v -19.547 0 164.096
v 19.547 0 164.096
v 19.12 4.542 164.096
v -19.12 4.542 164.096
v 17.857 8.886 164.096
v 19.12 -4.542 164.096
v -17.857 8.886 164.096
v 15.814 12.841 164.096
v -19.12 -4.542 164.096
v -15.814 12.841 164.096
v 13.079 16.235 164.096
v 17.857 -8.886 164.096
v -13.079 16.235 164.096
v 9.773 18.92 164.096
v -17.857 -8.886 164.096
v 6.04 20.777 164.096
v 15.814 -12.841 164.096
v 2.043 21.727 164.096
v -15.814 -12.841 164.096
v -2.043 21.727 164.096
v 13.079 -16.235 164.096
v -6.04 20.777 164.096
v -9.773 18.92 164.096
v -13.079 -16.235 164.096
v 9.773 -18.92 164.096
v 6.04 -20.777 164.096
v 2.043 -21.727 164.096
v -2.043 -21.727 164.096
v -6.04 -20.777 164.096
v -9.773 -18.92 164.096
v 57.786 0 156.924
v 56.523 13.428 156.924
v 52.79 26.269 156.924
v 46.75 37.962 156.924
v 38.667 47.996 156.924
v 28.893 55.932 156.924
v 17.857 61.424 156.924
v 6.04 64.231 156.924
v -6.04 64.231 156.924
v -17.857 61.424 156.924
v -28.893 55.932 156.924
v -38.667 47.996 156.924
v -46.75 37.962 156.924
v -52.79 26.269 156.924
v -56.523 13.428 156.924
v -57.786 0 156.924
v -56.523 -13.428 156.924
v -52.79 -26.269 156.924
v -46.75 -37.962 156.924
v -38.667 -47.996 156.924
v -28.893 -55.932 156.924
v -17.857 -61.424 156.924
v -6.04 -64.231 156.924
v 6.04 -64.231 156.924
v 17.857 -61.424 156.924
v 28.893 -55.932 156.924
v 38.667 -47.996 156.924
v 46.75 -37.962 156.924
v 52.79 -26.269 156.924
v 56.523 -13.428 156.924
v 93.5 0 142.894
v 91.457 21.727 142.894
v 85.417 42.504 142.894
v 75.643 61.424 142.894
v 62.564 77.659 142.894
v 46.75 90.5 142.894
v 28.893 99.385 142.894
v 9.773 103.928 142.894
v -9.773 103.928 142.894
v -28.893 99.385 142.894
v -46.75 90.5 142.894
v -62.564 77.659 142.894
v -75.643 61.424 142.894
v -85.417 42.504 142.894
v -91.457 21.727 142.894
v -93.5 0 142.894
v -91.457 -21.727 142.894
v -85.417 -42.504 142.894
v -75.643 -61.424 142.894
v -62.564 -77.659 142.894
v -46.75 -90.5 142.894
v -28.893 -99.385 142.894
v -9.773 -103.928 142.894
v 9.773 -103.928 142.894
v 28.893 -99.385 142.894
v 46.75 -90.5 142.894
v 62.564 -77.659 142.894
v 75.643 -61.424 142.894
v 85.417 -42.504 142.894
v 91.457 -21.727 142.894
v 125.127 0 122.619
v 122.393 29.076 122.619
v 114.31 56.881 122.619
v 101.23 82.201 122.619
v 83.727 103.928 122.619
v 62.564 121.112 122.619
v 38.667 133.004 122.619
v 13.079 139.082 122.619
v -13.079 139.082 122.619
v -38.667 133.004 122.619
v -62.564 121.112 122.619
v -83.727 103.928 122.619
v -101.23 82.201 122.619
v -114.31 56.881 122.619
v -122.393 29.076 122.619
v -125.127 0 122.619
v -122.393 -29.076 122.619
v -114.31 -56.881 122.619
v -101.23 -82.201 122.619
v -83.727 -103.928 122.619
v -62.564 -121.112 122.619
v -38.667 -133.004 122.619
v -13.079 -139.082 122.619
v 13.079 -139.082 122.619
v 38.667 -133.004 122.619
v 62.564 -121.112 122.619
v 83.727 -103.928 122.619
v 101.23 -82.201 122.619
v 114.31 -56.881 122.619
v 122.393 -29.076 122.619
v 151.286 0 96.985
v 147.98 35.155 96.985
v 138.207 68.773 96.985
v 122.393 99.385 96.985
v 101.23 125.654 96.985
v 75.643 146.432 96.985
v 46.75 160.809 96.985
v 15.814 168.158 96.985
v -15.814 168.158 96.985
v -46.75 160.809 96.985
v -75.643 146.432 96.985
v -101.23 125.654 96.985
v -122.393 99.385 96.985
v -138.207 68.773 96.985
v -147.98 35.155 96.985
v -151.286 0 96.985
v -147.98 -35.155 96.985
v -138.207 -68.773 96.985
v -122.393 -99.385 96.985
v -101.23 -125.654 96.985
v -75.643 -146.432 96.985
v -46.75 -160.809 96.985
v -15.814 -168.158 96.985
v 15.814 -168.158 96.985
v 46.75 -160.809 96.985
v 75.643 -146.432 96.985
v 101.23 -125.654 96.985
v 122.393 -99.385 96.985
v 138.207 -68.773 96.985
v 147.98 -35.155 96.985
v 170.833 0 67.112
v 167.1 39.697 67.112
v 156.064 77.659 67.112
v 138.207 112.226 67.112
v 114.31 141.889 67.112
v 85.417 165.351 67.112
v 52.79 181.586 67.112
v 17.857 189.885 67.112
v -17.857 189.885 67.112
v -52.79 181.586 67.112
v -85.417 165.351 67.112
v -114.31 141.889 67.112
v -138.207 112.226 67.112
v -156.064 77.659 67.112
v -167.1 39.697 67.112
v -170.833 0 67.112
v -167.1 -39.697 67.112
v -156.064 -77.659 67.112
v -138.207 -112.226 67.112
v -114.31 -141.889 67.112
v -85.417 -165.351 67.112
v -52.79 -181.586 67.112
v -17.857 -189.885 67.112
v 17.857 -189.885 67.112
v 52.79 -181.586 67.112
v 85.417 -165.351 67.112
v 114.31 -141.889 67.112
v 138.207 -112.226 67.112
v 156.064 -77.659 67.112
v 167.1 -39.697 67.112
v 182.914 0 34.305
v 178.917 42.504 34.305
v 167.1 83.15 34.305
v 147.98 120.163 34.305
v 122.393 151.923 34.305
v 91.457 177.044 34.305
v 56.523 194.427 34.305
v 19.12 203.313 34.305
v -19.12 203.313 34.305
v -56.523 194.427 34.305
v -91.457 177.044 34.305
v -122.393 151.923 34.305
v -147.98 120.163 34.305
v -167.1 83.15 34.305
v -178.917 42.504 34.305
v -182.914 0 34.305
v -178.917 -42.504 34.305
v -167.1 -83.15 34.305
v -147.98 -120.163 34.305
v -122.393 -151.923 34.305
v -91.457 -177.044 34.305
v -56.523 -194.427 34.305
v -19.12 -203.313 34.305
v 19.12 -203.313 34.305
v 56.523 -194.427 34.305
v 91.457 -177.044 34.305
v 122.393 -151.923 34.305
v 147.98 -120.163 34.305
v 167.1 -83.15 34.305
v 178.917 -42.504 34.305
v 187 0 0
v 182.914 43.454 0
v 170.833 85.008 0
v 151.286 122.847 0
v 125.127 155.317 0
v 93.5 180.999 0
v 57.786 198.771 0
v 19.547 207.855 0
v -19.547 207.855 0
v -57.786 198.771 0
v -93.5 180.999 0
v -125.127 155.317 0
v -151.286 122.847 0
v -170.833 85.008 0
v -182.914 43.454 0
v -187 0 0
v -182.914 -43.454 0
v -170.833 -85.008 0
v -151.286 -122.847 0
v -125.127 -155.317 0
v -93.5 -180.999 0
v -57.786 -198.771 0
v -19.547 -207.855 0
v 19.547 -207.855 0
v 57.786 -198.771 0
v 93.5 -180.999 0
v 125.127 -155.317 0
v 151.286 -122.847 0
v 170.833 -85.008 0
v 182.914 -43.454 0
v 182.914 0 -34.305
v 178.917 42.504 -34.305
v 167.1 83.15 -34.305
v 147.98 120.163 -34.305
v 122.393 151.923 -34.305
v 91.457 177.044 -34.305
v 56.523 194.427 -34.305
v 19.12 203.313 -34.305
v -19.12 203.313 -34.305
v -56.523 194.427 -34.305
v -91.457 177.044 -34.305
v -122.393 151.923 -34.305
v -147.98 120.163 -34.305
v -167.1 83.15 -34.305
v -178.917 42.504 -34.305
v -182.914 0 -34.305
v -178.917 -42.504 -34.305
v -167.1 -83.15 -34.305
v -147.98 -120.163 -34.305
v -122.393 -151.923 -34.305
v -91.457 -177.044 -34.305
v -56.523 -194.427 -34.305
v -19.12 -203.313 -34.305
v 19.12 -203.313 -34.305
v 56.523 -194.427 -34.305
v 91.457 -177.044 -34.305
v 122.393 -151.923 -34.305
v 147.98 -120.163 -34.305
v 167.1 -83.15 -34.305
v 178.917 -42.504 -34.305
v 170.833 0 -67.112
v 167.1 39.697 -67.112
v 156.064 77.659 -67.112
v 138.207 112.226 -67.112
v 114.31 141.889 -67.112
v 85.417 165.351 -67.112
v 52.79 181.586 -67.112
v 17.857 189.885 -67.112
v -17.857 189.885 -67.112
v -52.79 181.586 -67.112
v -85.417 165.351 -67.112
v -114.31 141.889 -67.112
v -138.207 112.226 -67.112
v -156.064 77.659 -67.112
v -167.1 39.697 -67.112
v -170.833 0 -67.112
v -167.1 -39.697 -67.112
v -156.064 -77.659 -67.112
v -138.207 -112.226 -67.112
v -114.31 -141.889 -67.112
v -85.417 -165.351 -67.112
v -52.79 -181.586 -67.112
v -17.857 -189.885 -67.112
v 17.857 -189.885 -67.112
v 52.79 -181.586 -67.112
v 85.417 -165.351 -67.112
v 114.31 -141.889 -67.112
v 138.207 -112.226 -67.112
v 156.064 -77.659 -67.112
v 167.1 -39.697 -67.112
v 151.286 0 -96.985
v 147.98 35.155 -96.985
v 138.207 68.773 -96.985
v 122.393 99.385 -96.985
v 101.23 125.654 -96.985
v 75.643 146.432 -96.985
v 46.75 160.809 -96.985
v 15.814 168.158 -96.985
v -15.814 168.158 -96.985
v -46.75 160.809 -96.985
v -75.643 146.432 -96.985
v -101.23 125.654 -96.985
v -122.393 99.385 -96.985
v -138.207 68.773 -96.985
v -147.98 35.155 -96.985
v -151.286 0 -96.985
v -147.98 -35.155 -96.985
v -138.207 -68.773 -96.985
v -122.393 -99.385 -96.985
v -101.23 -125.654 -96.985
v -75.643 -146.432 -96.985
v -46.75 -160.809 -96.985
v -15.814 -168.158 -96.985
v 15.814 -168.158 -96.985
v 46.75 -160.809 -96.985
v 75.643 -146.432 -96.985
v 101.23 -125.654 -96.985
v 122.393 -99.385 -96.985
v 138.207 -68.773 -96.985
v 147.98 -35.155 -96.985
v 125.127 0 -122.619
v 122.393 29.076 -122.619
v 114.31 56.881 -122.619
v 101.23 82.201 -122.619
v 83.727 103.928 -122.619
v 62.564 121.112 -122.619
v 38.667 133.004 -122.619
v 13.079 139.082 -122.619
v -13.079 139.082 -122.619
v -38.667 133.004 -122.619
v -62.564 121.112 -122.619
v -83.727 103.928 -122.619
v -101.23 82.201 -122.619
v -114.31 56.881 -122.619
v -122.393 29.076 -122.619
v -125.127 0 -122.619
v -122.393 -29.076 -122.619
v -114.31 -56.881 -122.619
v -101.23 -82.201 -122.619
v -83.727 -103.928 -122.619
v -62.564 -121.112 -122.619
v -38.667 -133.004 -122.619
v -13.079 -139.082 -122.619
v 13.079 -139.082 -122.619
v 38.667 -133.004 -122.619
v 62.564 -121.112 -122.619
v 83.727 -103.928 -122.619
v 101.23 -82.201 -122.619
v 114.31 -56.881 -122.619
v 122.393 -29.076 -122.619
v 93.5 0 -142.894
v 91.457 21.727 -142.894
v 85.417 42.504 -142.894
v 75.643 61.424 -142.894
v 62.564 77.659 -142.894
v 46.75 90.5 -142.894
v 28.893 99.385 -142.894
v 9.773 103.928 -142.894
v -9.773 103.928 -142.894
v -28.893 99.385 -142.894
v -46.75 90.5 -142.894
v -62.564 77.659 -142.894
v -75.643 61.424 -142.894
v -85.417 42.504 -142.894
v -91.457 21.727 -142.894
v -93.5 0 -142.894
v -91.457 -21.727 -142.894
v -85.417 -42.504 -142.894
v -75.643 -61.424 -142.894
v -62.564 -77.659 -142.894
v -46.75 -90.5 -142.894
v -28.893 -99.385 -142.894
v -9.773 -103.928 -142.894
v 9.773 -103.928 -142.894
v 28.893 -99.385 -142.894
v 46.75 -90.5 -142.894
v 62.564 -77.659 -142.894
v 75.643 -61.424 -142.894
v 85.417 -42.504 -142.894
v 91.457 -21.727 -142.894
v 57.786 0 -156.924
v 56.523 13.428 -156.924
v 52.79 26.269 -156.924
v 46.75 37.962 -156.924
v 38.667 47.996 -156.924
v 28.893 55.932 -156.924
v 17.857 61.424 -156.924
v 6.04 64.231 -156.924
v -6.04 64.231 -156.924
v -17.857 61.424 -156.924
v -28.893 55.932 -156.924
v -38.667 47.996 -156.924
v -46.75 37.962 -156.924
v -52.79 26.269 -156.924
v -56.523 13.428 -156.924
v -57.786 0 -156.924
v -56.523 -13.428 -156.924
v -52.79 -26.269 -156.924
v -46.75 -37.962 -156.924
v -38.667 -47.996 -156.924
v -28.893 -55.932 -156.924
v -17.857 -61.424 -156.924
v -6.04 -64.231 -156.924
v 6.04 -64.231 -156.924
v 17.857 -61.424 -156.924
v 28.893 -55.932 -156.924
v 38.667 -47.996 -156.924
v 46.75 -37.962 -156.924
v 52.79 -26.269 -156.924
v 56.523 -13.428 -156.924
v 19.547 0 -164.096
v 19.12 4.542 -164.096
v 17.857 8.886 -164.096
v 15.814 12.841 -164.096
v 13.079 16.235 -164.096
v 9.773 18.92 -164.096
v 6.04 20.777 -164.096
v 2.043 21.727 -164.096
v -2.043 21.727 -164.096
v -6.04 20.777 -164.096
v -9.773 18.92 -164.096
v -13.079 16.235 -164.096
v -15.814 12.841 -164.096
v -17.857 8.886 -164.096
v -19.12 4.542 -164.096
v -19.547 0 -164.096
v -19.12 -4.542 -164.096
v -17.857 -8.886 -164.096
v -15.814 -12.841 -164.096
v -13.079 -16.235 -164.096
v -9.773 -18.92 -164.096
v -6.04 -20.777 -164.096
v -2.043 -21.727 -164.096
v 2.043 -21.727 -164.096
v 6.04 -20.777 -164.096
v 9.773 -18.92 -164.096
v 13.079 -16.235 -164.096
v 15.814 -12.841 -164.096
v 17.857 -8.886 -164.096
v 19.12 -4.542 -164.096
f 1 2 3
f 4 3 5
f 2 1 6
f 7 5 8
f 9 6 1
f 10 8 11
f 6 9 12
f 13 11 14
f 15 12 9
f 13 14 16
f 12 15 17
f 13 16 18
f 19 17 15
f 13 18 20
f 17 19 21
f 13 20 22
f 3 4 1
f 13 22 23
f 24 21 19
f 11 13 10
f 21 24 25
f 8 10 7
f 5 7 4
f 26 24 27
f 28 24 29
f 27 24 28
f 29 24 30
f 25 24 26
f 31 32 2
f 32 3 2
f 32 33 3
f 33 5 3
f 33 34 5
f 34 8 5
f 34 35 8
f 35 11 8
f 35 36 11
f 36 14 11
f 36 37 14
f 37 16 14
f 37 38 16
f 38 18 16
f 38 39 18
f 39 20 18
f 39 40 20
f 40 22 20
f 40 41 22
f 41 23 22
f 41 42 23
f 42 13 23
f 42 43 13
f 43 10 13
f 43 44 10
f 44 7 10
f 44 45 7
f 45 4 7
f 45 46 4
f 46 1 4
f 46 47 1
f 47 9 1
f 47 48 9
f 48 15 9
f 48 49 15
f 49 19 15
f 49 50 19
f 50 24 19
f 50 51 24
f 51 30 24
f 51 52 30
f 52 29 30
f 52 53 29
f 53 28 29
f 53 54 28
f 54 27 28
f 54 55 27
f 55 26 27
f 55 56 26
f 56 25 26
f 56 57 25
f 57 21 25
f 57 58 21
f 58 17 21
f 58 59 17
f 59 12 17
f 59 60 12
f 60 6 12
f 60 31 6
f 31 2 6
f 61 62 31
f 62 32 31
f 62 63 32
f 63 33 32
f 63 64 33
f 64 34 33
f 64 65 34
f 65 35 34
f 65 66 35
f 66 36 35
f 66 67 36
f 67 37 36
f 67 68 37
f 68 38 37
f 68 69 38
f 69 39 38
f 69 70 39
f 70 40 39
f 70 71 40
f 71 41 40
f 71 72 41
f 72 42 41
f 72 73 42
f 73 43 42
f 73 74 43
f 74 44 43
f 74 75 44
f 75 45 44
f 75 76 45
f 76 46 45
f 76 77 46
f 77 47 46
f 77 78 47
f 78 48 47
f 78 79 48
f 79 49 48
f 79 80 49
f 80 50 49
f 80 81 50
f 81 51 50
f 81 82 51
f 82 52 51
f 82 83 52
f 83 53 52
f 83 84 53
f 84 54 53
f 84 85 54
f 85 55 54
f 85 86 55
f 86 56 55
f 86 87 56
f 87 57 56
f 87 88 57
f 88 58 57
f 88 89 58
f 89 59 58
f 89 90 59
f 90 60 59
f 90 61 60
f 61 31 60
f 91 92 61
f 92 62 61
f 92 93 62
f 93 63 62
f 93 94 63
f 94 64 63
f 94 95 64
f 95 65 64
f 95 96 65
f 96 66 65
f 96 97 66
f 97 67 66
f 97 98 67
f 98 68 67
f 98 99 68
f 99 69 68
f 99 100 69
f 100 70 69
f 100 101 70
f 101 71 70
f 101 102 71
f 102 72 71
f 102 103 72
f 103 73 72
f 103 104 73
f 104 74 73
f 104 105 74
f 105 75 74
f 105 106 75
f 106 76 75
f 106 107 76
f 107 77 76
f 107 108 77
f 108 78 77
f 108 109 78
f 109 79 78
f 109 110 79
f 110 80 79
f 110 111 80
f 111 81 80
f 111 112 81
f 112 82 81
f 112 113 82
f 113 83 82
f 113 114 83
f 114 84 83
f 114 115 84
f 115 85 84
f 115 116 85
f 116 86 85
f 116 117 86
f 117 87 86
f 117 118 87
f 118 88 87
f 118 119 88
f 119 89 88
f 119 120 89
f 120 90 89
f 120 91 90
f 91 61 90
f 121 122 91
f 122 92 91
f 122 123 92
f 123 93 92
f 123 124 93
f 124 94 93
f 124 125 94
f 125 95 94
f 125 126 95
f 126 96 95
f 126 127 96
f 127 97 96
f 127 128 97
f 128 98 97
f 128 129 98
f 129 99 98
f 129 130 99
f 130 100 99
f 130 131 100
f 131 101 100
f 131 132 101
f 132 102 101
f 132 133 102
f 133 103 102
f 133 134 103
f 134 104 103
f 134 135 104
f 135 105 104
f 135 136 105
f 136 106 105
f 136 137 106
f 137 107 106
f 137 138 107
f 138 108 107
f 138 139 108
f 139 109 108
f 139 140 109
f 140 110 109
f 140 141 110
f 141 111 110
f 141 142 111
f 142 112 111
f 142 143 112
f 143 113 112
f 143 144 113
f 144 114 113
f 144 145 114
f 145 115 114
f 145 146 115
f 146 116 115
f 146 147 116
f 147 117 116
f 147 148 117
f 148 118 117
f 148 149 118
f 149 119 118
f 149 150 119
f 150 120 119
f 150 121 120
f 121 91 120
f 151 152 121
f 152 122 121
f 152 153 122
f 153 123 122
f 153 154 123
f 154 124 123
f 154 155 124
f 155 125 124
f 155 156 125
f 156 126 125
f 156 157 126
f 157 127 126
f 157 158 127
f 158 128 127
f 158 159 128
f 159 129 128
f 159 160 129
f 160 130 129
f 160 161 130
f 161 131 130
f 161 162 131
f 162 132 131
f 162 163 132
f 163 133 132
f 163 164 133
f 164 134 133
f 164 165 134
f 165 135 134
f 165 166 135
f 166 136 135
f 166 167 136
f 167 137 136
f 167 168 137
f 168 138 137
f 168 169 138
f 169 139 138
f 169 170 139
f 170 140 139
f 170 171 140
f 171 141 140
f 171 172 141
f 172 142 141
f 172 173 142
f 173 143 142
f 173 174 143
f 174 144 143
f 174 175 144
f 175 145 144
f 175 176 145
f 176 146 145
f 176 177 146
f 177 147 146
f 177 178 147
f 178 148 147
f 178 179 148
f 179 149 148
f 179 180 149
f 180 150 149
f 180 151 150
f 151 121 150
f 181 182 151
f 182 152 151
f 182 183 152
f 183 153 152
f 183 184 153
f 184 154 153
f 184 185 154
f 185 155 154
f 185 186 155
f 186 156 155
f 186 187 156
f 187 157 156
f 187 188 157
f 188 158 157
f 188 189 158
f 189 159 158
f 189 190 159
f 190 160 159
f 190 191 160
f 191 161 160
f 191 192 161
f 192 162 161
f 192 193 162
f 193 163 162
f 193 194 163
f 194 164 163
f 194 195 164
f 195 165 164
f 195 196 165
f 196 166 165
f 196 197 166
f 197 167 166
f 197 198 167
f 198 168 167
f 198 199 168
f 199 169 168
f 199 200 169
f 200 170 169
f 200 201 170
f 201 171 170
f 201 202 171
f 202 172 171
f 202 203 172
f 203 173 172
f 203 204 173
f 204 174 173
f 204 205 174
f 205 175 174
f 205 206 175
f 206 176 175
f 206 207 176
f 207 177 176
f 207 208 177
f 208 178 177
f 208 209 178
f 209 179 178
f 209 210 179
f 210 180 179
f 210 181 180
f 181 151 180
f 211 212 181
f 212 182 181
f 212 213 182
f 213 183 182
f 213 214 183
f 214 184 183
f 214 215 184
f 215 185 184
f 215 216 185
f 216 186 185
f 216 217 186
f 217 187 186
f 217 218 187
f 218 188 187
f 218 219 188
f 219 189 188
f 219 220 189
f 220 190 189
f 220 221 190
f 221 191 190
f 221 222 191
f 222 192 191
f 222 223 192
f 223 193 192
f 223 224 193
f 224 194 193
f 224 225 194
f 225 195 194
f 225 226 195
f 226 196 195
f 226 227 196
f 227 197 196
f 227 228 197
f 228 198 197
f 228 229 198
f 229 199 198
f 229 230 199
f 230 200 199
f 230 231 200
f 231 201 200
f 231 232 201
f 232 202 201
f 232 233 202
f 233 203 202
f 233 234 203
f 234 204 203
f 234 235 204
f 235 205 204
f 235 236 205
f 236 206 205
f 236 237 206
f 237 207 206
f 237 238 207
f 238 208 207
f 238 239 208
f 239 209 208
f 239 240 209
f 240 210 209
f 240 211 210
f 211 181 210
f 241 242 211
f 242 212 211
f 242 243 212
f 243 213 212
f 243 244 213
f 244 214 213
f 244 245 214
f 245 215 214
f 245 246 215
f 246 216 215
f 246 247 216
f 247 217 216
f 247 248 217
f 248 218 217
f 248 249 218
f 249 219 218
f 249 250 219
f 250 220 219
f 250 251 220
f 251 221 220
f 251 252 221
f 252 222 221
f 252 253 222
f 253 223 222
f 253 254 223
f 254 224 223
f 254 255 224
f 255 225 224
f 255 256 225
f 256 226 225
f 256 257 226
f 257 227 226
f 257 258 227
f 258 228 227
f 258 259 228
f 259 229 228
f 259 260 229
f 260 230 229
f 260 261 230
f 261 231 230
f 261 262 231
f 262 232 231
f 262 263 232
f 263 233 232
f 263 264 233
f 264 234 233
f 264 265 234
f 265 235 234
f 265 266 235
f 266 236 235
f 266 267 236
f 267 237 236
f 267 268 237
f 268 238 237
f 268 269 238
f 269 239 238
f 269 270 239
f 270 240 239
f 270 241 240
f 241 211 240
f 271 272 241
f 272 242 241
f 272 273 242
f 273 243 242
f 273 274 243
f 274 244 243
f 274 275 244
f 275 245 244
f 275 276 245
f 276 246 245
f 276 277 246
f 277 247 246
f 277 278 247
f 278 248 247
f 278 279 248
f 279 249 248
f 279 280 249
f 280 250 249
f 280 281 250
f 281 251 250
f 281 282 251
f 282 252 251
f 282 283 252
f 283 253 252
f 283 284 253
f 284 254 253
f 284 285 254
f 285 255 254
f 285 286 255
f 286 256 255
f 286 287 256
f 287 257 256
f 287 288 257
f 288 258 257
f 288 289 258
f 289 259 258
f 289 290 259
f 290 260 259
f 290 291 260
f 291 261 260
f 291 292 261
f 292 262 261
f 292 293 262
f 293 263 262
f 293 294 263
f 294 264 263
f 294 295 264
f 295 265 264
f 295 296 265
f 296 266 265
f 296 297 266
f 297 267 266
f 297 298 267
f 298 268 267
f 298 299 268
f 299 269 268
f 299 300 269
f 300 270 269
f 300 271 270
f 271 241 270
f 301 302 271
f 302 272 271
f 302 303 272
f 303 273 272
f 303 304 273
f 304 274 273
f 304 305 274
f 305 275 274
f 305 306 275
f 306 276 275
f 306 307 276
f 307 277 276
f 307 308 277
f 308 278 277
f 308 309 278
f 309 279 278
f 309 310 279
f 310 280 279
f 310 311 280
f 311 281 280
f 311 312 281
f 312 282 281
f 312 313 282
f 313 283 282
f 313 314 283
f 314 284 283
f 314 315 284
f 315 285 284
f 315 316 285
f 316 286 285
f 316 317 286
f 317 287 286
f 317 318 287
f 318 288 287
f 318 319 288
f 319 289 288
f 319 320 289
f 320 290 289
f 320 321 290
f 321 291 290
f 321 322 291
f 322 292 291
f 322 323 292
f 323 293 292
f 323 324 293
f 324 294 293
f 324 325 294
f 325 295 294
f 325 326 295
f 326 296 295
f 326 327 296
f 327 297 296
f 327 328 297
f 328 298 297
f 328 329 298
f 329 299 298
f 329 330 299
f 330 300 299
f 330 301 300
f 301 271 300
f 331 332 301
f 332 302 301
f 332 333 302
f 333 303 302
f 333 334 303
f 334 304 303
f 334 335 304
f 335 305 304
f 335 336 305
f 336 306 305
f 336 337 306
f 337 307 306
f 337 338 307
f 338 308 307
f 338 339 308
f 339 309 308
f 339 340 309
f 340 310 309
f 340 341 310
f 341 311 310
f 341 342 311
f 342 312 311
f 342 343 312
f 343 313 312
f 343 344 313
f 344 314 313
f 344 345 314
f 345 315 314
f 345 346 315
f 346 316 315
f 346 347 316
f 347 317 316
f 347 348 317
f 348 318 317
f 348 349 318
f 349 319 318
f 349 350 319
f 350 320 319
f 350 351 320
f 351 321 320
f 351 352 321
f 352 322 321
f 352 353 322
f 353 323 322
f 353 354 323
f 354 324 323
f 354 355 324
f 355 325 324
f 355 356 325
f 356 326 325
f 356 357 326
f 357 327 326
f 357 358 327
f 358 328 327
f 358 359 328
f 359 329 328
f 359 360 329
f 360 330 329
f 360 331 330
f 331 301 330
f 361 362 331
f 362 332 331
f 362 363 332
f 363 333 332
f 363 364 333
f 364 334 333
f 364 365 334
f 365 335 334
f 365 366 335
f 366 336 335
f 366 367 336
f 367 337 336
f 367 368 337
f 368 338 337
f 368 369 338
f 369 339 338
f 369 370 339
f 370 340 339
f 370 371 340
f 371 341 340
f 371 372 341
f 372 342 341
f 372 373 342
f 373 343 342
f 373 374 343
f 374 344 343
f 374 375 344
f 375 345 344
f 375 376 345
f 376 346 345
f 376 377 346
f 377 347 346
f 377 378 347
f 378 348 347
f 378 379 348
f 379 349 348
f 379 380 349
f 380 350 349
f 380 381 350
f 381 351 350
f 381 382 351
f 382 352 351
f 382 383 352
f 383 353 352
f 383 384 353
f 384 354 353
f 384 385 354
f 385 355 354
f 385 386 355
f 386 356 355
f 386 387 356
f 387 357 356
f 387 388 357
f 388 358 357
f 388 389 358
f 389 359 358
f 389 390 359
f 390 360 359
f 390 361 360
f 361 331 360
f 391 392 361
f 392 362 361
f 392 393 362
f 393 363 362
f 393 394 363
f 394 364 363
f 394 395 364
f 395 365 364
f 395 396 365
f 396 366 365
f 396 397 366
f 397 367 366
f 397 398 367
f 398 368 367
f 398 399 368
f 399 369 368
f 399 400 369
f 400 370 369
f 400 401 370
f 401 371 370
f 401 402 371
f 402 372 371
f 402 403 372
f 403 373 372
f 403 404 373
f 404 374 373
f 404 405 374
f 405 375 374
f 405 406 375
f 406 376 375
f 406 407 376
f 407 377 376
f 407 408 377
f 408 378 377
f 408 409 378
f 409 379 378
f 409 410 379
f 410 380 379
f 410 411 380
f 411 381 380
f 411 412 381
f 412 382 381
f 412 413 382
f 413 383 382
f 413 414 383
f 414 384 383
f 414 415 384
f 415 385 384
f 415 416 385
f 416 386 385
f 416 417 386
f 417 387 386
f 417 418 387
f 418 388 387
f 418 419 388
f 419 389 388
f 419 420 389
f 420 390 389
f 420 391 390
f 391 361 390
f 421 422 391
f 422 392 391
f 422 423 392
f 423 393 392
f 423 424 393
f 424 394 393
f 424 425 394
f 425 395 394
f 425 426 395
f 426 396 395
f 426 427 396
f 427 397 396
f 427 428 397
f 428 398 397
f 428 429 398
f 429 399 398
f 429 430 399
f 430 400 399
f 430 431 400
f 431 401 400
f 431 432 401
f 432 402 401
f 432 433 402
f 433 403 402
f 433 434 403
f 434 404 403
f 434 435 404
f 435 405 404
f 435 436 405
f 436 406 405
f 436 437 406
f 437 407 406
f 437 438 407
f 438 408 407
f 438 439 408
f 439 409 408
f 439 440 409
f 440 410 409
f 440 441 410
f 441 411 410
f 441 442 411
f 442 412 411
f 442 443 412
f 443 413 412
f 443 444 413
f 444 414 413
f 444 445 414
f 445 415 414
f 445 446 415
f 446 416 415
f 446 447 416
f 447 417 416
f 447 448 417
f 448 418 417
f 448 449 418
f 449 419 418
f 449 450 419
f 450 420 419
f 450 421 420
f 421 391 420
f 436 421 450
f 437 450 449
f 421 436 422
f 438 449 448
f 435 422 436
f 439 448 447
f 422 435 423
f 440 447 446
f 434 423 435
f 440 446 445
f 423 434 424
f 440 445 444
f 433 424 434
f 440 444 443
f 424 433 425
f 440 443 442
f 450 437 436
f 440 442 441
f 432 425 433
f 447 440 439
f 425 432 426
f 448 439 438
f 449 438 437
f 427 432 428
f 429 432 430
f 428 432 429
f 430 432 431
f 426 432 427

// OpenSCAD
// Generated by SolidPython 1.0.1 on 2020-07-29 00:46:53


scale(v = [17, 19, 15]) {
	sphere(r = 11);
}
/***********************************************
*********      SolidPython code:      **********
************************************************
 
# import packages: SolidPython
from solid import *
from solid.utils import *
from itertools import chain, combinations, permutations


class Resize:

    def __init__(self, scad_file):
        self.scad_file = scad_file
        #self.scad_file = import_scad(scad_file)
        # cone/cylinder param:
        self.r1 = 0
        self.r2 = 0
        self.h = 0
        # rectangular prism param:
        self.w = 0
        self.l = 0
        # ellipse param:
        self.r = 0

    # import OpenScad code (file name corresponds to shape)


    # classify shape + parameters
    def assign(self, param1, param2, param3):
        if self.scad_file == 'cone.scad':
            self.r1 = param1
            self.r2 = param2
            self.h = param3
        elif self.scad_file == 'cylinder.scad':
            self.r1 = param1
            self.r2 = param2
            self.h = param3
        elif self.scad_file == 'rectangularPrism.scad':
            self.h = param1
            self.l = param2
            self.w = param3
        else:
            self.r = param1
            self.h = param2

    # resize parameters
    def iterate(self):
        x = range(3, 20, 2)
        i = 1
        if self.scad_file == 'cone.scad':
            tempList = list(permutations(x, 2))
            for temp in tempList:
                param1 = temp[0]
                param2 = temp[1]
                filepath = 'produced_scad_files/' + 'cone' + str(param1) + '_' + str(param2) + '_' + '.scad'
                scad_render_to_file(cylinder(h=param1, r1=param2, r2=0), filepath)

        elif self.scad_file == 'cylinder.scad':
            tempList = list(permutations(x, 3))
            for temp in tempList:
                param1 = temp[0]
                param2 = temp[1]
                filepath = 'produced_scad_files/' + 'cylinder' + str(param1) + '_' + str(param2) + '_' + '.scad'
                scad_render_to_file(cylinder(h=param1, r1=param2, r2=param2), filepath)

        elif self.scad_file == 'rectangularPrism.scad':
            tempList = list(permutations(x, 3))
            for temp in tempList:
                param1 = temp[0]
                param2 = temp[1]
                param3 = temp[2]
                filepath = 'produced_scad_files/' + 'rectangularPrism' + str(param1) + '_' + str(param2) + '_' + str(
                    param3) + '.scad'
                scad_render_to_file(cube(size=(param1, param2, param3)), filepath)

        elif self.scad_file == 'ellipse.scad':
            tempList = list(permutations(x, 4))
            for temp in tempList:
                param1 = temp[0]
                param2 = temp[1]
                param3 = temp[2]
                param4 = temp[3]
                filepath = 'produced_scad_files/' + 'ellipse' + str(param1) + '_' + str(param2) + '_' + str(param3) + '_' + str(param4) + '.scad'
                scad_render_to_file(scale([param1, param2, param3])(sphere(r=param4)), filepath)

    def render_to_scadfile(self):
        scad_render_to_file(scad, 'example.scad') 
 
************************************************/
